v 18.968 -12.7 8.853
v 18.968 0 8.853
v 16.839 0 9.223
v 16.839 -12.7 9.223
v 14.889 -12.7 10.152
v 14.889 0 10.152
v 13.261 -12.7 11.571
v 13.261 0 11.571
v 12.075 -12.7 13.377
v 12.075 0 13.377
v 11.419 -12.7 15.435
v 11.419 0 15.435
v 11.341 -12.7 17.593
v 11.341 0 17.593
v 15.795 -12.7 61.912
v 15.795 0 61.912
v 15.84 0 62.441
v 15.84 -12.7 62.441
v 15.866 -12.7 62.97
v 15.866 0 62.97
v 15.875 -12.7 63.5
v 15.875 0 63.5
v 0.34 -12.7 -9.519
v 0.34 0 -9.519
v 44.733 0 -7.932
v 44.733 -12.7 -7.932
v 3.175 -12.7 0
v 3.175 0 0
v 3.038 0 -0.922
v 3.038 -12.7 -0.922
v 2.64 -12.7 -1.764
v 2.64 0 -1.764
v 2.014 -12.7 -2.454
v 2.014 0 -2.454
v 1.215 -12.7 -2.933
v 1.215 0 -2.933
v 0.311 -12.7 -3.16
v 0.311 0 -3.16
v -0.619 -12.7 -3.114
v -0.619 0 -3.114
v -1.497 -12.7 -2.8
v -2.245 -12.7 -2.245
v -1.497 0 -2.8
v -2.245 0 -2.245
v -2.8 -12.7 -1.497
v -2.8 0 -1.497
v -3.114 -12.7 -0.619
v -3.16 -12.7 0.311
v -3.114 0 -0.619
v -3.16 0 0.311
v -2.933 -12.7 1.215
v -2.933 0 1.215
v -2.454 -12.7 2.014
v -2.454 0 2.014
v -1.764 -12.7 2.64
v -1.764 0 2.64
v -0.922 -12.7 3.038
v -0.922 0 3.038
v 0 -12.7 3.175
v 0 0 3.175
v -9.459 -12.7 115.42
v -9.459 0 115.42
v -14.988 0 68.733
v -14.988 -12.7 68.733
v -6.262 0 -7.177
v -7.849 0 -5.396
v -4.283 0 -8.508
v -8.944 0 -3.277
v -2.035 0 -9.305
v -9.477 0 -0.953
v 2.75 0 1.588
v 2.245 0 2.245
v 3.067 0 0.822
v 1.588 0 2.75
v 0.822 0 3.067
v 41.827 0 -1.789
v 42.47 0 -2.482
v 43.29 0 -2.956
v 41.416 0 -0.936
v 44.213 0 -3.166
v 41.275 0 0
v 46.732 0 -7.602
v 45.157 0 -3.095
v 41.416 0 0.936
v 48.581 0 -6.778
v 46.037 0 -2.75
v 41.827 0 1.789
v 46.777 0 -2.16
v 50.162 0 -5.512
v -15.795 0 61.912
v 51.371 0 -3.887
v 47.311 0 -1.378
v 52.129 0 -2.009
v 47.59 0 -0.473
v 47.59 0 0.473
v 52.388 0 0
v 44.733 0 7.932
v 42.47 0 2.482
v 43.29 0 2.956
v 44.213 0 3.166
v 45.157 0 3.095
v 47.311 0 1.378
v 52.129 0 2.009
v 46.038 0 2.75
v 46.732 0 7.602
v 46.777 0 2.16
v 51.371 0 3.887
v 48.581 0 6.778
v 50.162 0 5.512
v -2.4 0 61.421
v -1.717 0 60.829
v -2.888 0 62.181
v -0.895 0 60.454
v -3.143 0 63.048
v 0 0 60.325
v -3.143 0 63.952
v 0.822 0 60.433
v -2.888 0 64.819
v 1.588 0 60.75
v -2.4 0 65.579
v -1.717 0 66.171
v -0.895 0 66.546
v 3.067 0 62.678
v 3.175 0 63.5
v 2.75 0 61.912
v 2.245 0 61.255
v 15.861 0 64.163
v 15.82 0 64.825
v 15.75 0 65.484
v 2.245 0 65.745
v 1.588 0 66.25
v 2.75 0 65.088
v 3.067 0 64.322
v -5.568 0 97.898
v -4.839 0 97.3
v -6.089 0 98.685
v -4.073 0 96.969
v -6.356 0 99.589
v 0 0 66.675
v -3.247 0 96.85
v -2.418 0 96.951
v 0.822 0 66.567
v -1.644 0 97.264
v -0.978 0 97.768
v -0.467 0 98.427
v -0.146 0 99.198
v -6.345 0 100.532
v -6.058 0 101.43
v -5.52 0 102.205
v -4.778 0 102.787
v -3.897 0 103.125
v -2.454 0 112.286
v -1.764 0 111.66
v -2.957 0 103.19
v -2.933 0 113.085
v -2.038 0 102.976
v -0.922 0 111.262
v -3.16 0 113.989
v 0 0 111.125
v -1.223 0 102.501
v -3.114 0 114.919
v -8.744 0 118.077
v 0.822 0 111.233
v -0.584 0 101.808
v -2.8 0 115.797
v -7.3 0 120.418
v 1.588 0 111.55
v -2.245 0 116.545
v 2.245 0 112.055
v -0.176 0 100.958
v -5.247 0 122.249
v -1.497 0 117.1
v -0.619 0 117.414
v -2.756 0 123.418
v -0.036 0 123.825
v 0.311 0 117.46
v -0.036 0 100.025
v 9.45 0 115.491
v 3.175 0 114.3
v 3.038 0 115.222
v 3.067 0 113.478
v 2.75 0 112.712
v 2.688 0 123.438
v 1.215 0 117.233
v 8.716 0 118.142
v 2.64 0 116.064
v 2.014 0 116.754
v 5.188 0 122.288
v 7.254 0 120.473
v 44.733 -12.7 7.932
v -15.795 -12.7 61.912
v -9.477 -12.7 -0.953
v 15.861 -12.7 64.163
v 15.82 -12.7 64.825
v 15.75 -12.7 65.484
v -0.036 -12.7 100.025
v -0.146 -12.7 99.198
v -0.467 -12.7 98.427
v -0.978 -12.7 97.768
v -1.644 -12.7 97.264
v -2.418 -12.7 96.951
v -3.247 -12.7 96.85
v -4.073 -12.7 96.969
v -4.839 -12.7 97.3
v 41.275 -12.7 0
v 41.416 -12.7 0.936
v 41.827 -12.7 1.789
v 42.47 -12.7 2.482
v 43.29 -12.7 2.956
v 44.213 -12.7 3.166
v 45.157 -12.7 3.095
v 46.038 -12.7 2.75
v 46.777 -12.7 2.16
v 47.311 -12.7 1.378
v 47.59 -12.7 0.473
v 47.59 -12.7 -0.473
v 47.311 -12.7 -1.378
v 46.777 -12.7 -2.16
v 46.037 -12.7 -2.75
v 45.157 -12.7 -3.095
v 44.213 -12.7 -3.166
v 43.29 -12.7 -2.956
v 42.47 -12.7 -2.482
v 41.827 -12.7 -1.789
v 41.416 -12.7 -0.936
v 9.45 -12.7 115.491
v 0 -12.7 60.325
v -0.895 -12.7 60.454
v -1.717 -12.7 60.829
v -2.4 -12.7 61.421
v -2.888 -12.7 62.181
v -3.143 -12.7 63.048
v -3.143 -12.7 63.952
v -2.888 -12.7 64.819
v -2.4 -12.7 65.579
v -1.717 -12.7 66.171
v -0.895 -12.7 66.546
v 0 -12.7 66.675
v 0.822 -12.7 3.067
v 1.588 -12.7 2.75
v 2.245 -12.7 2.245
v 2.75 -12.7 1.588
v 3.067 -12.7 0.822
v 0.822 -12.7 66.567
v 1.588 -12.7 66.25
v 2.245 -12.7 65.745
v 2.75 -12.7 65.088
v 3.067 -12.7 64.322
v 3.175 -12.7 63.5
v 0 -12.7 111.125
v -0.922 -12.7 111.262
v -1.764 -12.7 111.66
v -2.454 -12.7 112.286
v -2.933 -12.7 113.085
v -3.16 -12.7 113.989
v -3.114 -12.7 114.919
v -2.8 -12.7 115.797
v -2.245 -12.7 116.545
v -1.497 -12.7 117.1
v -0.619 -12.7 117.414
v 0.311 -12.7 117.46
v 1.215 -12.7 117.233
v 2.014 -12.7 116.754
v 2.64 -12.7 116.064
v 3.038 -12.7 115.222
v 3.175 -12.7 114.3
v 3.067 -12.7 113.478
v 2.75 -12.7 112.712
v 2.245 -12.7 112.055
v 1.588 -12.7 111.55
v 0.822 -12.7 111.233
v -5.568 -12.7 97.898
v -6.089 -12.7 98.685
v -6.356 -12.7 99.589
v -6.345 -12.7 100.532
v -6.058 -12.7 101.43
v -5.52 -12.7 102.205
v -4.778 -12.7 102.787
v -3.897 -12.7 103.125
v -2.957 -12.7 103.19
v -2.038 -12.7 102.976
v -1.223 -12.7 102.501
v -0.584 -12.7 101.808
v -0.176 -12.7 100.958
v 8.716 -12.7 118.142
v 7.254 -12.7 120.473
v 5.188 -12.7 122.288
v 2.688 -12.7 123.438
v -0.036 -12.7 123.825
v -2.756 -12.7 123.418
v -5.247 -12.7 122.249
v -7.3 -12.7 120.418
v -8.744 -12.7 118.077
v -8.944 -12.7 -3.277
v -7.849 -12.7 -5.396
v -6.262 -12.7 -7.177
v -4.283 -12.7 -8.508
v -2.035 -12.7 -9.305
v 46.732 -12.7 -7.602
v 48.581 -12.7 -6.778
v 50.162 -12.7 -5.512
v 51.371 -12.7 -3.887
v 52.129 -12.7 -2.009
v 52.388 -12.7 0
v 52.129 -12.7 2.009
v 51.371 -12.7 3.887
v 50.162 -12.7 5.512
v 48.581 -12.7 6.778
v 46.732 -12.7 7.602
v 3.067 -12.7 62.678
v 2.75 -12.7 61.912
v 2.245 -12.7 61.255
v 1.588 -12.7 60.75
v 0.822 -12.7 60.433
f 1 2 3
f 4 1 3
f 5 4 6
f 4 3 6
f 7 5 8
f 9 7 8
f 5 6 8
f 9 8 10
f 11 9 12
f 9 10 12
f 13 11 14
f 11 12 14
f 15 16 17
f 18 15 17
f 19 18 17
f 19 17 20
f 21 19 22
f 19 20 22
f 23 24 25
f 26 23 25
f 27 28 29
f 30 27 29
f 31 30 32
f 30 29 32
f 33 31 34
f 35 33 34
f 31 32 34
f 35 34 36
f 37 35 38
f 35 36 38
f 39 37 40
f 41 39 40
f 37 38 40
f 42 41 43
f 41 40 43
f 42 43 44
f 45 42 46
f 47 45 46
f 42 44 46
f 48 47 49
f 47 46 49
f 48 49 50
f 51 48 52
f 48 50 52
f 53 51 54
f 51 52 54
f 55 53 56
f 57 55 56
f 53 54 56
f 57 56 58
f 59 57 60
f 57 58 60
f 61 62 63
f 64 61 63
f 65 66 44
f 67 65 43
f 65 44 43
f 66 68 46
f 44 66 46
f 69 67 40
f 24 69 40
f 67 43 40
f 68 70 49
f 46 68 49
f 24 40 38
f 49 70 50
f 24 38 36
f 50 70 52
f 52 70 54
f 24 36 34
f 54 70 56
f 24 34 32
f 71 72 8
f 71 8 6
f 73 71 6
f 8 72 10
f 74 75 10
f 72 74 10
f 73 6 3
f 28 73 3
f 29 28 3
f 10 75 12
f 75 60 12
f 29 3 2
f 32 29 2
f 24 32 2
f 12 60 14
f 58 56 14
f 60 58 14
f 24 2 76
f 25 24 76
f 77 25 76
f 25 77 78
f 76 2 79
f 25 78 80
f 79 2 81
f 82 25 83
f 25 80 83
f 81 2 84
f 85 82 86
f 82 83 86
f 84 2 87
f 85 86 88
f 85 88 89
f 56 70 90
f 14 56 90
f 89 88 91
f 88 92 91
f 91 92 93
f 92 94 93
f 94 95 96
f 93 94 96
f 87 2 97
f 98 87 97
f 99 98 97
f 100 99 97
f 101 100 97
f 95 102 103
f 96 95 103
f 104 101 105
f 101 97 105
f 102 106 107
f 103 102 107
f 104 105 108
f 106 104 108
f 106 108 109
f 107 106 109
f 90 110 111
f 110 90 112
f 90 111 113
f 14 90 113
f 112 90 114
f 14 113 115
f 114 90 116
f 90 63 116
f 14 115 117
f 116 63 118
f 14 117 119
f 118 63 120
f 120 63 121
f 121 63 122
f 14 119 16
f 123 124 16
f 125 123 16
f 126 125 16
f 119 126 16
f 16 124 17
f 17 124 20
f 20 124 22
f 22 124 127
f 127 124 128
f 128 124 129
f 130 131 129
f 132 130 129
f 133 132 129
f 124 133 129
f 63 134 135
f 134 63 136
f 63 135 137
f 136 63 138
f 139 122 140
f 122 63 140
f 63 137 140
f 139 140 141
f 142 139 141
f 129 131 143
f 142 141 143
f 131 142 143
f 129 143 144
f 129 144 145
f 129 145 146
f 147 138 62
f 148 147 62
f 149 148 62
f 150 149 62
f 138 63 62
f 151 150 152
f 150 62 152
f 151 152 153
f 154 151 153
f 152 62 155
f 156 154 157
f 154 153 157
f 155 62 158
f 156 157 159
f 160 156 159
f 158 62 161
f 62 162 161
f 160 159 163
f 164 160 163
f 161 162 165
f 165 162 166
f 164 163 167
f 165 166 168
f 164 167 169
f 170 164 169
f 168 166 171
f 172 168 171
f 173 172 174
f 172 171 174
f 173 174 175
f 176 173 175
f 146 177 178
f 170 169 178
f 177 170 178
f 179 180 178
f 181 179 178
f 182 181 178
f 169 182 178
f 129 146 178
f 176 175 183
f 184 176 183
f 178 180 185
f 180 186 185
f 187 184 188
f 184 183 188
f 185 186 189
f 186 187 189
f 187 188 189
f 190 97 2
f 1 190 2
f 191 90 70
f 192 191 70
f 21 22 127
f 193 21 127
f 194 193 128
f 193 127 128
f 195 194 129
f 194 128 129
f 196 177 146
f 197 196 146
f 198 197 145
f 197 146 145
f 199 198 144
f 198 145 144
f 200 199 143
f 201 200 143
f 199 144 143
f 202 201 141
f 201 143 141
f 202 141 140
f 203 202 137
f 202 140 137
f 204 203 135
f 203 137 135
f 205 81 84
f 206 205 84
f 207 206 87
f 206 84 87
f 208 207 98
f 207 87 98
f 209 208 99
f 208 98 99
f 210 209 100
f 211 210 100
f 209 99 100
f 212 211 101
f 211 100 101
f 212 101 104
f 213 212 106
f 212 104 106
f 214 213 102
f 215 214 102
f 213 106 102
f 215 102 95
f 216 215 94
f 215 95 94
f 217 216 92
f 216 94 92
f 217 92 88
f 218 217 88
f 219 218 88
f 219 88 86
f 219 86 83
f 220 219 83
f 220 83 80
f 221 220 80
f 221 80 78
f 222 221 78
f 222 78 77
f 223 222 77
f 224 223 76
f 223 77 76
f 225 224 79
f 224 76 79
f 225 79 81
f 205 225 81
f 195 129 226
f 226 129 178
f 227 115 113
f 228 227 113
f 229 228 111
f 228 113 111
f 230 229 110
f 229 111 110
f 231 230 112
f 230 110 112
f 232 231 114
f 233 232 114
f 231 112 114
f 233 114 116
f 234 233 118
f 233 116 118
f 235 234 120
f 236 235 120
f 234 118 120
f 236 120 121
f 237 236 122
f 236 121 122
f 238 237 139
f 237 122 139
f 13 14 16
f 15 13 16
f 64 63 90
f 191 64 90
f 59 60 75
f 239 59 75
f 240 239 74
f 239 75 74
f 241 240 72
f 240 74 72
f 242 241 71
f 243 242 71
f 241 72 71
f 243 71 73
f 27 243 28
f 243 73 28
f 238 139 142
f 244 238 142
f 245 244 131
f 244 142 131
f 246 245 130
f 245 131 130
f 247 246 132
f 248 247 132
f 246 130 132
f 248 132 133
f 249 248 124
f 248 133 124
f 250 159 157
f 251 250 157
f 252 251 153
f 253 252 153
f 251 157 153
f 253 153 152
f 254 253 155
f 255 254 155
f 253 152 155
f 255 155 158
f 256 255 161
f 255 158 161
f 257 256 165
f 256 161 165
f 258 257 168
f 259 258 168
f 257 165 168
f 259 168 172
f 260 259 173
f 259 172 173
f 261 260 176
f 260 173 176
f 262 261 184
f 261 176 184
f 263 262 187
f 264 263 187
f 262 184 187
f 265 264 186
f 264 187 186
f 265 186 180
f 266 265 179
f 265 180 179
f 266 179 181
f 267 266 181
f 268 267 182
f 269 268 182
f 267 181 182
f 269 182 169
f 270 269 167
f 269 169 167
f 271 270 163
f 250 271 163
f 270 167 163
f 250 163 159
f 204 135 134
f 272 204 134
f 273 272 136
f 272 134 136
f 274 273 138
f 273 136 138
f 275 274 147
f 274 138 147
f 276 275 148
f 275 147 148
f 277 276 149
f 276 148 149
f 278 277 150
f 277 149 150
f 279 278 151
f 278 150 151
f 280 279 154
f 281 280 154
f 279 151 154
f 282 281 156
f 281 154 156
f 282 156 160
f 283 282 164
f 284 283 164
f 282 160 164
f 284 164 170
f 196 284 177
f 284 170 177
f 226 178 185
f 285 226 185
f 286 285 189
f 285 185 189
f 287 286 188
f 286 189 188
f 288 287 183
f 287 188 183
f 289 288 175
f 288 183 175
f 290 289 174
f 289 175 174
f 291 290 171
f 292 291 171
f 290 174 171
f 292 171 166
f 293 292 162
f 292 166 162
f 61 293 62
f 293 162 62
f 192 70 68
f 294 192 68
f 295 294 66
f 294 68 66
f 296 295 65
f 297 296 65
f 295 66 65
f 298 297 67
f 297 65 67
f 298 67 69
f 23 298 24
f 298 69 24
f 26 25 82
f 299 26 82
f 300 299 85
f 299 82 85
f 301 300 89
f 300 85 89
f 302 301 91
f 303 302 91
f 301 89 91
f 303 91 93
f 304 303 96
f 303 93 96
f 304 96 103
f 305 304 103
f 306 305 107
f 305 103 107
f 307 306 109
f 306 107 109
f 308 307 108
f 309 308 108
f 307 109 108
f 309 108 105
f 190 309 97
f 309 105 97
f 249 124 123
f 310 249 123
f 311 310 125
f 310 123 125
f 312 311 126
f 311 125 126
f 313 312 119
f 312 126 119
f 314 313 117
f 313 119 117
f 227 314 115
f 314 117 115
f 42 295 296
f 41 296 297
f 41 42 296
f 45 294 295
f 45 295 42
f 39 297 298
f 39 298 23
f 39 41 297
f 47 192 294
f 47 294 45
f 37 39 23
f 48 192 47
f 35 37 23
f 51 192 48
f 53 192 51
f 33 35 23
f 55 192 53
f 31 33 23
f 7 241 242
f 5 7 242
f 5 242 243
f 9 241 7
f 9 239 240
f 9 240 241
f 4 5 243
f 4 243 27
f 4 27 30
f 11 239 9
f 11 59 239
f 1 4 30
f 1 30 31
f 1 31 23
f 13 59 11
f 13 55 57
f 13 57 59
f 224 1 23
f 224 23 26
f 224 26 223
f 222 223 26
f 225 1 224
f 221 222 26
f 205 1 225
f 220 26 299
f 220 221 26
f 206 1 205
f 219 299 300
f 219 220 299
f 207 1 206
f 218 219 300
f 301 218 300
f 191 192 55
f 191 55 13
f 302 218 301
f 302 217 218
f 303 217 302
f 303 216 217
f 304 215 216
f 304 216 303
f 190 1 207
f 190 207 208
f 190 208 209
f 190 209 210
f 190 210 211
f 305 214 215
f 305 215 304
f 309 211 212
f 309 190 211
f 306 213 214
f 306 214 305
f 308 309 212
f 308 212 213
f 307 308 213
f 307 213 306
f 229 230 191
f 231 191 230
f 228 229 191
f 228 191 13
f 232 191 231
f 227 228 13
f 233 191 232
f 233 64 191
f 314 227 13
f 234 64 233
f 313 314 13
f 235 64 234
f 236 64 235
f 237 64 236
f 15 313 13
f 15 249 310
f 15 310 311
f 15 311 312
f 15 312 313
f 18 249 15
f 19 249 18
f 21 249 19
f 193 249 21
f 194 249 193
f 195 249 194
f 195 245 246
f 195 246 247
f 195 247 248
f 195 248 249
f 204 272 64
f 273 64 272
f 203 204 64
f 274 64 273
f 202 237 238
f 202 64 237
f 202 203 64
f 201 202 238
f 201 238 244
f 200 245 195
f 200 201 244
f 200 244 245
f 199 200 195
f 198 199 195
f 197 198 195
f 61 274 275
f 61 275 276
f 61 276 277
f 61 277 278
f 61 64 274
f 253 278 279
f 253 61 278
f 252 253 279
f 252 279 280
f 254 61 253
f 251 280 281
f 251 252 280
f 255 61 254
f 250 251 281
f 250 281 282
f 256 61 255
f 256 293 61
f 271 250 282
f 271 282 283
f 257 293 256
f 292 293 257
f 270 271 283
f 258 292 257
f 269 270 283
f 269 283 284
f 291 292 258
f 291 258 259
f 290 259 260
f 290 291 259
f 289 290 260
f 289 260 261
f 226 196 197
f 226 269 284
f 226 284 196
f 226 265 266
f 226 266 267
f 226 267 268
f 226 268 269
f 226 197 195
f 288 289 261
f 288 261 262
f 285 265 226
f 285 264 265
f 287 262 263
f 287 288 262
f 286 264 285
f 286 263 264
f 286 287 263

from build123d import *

# Parameters (mm, degrees)
F1_DEPTH = 12.7


with BuildPart() as f1:
    # F0 (on Front) → F1 (new body)
    with BuildSketch(Plane.XZ):
        with BuildLine():
            Line((0, 79.375), (0, 89.5573869348))
            Line((0, 89.5573869348), (0, 100.0252))
            Line((0, 100.0252), (-0.0357827719, 100.0252))
            ThreePointArc((-0.0357827719, 100.0252), (-1.6439653205, 97.2637315367), (-4.8393784091, 97.2997089891))
            Line((-4.8393784091, 97.2997089891), (-4.8393784091, 78.6193928983))
            ThreePointArc((-4.8393784091, 78.6193928983), (-2.4490062004, 79.1849607469), (0, 79.375))
        make_face()
        with BuildLine():
            Line((0, 100.0252), (0, 89.5573869348))
            Line((0, 89.5573869348), (0, 79.375))
            ThreePointArc((0, 79.375), (10.5003255158, 75.40625), (15.7504882737, 65.484375))
            Line((15.7504882737, 65.484375), (9.4502929642, 115.490625))
            ThreePointArc((9.4502929642, 115.490625), (9.5063048942, 114.896483242), (9.525, 114.3))
            ThreePointArc((9.525, 114.3), (6.7351920908, 107.5648079092), (0, 104.775))
            Line((0, 104.775), (0, 100.0252))
        make_face()
        with BuildLine():
            Line((-0.0357827719, 100.0252), (0, 100.0252))
            Line((0, 100.0252), (0, 104.775))
            ThreePointArc((0, 104.775), (-7.1202192788, 107.9732233782), (-9.4589053806, 115.4201490977))
            Line((-9.4589053806, 115.4201490977), (-14.9877324754, 68.7329246359))
            ThreePointArc((-14.9877324754, 68.7329246359), (-11.0776416797, 74.8710808553), (-4.8393784091, 78.6193928983))
            Line((-4.8393784091, 78.6193928983), (-4.8393784091, 97.2997089891))
            ThreePointArc((-4.8393784091, 97.2997089891), (-4.7776002233, 102.7866684633), (-0.0357827719, 100.0252))
        make_face()
        with BuildLine():
            ThreePointArc((15.7504882737, 65.484375), (10.5003255158, 75.40625), (0, 79.375))
            Line((0, 79.375), (0, 66.675))
            ThreePointArc((0, 66.675), (2.2450640303, 65.7450640303), (3.175, 63.5))
            ThreePointArc((3.175, 63.5), (2.2450640303, 61.2549359697), (0, 60.325))
            Line((0, 60.325), (0, 47.625))
            ThreePointArc((0, 47.625), (10.6492737428, 51.7267849017), (15.7954255641, 61.9125))
            ThreePointArc((15.7954255641, 61.9125), (15.8550939106, 62.7052534459), (15.875, 63.5))
            ThreePointArc((15.875, 63.5), (15.8438414904, 64.4941387366), (15.7504882737, 65.484375))
        make_face()
        with BuildLine():
            Line((0, 66.675), (0, 79.375))
            ThreePointArc((0, 79.375), (-2.4490062004, 79.1849607469), (-4.8393784091, 78.6193928983))
            ThreePointArc((-4.8393784091, 78.6193928983), (-11.0776416797, 74.8710808553), (-14.9877324754, 68.7329246359))
            Line((-14.9877324754, 68.7329246359), (-15.7954255641, 61.9125))
            ThreePointArc((-15.7954255641, 61.9125), (-10.6492737428, 51.7267849017), (0, 47.625))
            Line((0, 47.625), (0, 60.325))
            ThreePointArc((0, 60.325), (-3.175, 63.5), (0, 66.675))
        make_face()
        with BuildLine():
            ThreePointArc((-9.4589053806, 115.4201490977), (-7.1202192788, 107.9732233782), (0, 104.775))
            ThreePointArc((0, 104.775), (6.7351920908, 107.5648079092), (9.525, 114.3))
            ThreePointArc((9.525, 114.3), (9.5063048942, 114.896483242), (9.4502929642, 115.490625))
            ThreePointArc((9.4502929642, 115.490625), (-0.0355000934, 123.8249338446), (-9.4589053806, 115.4201490977))
        make_face()
        with BuildLine():
            ThreePointArc((3.175, 114.3), (2.2450640303, 112.0549359697), (0, 111.125))
            ThreePointArc((0, 111.125), (-2.2450640303, 116.5450640303), (3.175, 114.3))
        make_face(mode=Mode.SUBTRACT)
        with BuildLine():
            ThreePointArc((15.7954255641, 61.9125), (10.6492737428, 51.7267849017), (0, 47.625))
            Line((0, 47.625), (0, 9.525))
            ThreePointArc((0, 9.525), (6.7351920908, 6.7351920908), (9.525, 0))
            Line((9.525, 0), (36.5125, 0))
            ThreePointArc((36.5125, 0), (38.9384772185, 5.7120069047), (44.7334821429, 7.9324362036))
            Line((44.7334821429, 7.9324362036), (18.9676000005, 8.8532337108))
            ThreePointArc((18.9676000005, 8.8532337108), (13.2611998974, 11.5713591498), (11.3411865923, 17.5933818124))
            Line((11.3411865923, 17.5933818124), (15.7954255641, 61.9125))
        make_face()
        with BuildLine():
            Line((0, 9.525), (0, 47.625))
            ThreePointArc((0, 47.625), (-10.6492737428, 51.7267849017), (-15.7954255641, 61.9125))
            Line((-15.7954255641, 61.9125), (-9.4772553384, -0.9525))
            ThreePointArc((-9.4772553384, -0.9525), (-7.063929059, 6.3895642457), (0, 9.525))
        make_face()
        with BuildLine():
            ThreePointArc((9.525, 0), (6.7351920908, 6.7351920908), (0, 9.525))
            Line((0, 9.525), (0, 3.175))
            ThreePointArc((0, 3.175), (2.2450640303, 2.2450640303), (3.175, 0))
            Line((3.175, 0), (9.525, 0))
        make_face()
        with BuildLine():
            Line((0, 3.175), (0, 9.525))
            ThreePointArc((0, 9.525), (-7.063929059, 6.3895642457), (-9.4772553384, -0.9525))
            ThreePointArc((-9.4772553384, -0.9525), (-6.2623833816, -7.1769199091), (0.3401785714, -9.5189234444))
            ThreePointArc((0.3401785714, -9.5189234444), (6.8544082857, -6.6138273378), (9.525, 0))
            Line((9.525, 0), (3.175, 0))
            ThreePointArc((3.175, 0), (-2.2450640303, -2.2450640303), (0, 3.175))
        make_face()
        with BuildLine():
            Line((36.5125, 0), (9.525, 0))
            ThreePointArc((9.525, 0), (6.8544082857, -6.6138273378), (0.3401785714, -9.5189234444))
            Line((0.3401785714, -9.5189234444), (44.7334821429, -7.9324362036))
            ThreePointArc((44.7334821429, -7.9324362036), (38.9384772185, -5.7120069047), (36.5125, 0))
        make_face()
        with BuildLine():
            ThreePointArc((44.7334821429, 7.9324362036), (38.9384772185, 5.7120069047), (36.5125, 0))
            ThreePointArc((36.5125, 0), (38.9384772185, -5.7120069047), (44.7334821429, -7.9324362036))
            ThreePointArc((44.7334821429, -7.9324362036), (50.1620069047, -5.5115227815), (52.3875, 0))
            ThreePointArc((52.3875, 0), (50.1620069047, 5.5115227815), (44.7334821429, 7.9324362036))
        make_face()
        with BuildLine():
            ThreePointArc((47.625, 0), (44.45, -3.175), (41.275, 0))
            ThreePointArc((41.275, 0), (44.45, 3.175), (47.625, 0))
        make_face(mode=Mode.SUBTRACT)
    extrude(amount=F1_DEPTH)


solid = f1.part
